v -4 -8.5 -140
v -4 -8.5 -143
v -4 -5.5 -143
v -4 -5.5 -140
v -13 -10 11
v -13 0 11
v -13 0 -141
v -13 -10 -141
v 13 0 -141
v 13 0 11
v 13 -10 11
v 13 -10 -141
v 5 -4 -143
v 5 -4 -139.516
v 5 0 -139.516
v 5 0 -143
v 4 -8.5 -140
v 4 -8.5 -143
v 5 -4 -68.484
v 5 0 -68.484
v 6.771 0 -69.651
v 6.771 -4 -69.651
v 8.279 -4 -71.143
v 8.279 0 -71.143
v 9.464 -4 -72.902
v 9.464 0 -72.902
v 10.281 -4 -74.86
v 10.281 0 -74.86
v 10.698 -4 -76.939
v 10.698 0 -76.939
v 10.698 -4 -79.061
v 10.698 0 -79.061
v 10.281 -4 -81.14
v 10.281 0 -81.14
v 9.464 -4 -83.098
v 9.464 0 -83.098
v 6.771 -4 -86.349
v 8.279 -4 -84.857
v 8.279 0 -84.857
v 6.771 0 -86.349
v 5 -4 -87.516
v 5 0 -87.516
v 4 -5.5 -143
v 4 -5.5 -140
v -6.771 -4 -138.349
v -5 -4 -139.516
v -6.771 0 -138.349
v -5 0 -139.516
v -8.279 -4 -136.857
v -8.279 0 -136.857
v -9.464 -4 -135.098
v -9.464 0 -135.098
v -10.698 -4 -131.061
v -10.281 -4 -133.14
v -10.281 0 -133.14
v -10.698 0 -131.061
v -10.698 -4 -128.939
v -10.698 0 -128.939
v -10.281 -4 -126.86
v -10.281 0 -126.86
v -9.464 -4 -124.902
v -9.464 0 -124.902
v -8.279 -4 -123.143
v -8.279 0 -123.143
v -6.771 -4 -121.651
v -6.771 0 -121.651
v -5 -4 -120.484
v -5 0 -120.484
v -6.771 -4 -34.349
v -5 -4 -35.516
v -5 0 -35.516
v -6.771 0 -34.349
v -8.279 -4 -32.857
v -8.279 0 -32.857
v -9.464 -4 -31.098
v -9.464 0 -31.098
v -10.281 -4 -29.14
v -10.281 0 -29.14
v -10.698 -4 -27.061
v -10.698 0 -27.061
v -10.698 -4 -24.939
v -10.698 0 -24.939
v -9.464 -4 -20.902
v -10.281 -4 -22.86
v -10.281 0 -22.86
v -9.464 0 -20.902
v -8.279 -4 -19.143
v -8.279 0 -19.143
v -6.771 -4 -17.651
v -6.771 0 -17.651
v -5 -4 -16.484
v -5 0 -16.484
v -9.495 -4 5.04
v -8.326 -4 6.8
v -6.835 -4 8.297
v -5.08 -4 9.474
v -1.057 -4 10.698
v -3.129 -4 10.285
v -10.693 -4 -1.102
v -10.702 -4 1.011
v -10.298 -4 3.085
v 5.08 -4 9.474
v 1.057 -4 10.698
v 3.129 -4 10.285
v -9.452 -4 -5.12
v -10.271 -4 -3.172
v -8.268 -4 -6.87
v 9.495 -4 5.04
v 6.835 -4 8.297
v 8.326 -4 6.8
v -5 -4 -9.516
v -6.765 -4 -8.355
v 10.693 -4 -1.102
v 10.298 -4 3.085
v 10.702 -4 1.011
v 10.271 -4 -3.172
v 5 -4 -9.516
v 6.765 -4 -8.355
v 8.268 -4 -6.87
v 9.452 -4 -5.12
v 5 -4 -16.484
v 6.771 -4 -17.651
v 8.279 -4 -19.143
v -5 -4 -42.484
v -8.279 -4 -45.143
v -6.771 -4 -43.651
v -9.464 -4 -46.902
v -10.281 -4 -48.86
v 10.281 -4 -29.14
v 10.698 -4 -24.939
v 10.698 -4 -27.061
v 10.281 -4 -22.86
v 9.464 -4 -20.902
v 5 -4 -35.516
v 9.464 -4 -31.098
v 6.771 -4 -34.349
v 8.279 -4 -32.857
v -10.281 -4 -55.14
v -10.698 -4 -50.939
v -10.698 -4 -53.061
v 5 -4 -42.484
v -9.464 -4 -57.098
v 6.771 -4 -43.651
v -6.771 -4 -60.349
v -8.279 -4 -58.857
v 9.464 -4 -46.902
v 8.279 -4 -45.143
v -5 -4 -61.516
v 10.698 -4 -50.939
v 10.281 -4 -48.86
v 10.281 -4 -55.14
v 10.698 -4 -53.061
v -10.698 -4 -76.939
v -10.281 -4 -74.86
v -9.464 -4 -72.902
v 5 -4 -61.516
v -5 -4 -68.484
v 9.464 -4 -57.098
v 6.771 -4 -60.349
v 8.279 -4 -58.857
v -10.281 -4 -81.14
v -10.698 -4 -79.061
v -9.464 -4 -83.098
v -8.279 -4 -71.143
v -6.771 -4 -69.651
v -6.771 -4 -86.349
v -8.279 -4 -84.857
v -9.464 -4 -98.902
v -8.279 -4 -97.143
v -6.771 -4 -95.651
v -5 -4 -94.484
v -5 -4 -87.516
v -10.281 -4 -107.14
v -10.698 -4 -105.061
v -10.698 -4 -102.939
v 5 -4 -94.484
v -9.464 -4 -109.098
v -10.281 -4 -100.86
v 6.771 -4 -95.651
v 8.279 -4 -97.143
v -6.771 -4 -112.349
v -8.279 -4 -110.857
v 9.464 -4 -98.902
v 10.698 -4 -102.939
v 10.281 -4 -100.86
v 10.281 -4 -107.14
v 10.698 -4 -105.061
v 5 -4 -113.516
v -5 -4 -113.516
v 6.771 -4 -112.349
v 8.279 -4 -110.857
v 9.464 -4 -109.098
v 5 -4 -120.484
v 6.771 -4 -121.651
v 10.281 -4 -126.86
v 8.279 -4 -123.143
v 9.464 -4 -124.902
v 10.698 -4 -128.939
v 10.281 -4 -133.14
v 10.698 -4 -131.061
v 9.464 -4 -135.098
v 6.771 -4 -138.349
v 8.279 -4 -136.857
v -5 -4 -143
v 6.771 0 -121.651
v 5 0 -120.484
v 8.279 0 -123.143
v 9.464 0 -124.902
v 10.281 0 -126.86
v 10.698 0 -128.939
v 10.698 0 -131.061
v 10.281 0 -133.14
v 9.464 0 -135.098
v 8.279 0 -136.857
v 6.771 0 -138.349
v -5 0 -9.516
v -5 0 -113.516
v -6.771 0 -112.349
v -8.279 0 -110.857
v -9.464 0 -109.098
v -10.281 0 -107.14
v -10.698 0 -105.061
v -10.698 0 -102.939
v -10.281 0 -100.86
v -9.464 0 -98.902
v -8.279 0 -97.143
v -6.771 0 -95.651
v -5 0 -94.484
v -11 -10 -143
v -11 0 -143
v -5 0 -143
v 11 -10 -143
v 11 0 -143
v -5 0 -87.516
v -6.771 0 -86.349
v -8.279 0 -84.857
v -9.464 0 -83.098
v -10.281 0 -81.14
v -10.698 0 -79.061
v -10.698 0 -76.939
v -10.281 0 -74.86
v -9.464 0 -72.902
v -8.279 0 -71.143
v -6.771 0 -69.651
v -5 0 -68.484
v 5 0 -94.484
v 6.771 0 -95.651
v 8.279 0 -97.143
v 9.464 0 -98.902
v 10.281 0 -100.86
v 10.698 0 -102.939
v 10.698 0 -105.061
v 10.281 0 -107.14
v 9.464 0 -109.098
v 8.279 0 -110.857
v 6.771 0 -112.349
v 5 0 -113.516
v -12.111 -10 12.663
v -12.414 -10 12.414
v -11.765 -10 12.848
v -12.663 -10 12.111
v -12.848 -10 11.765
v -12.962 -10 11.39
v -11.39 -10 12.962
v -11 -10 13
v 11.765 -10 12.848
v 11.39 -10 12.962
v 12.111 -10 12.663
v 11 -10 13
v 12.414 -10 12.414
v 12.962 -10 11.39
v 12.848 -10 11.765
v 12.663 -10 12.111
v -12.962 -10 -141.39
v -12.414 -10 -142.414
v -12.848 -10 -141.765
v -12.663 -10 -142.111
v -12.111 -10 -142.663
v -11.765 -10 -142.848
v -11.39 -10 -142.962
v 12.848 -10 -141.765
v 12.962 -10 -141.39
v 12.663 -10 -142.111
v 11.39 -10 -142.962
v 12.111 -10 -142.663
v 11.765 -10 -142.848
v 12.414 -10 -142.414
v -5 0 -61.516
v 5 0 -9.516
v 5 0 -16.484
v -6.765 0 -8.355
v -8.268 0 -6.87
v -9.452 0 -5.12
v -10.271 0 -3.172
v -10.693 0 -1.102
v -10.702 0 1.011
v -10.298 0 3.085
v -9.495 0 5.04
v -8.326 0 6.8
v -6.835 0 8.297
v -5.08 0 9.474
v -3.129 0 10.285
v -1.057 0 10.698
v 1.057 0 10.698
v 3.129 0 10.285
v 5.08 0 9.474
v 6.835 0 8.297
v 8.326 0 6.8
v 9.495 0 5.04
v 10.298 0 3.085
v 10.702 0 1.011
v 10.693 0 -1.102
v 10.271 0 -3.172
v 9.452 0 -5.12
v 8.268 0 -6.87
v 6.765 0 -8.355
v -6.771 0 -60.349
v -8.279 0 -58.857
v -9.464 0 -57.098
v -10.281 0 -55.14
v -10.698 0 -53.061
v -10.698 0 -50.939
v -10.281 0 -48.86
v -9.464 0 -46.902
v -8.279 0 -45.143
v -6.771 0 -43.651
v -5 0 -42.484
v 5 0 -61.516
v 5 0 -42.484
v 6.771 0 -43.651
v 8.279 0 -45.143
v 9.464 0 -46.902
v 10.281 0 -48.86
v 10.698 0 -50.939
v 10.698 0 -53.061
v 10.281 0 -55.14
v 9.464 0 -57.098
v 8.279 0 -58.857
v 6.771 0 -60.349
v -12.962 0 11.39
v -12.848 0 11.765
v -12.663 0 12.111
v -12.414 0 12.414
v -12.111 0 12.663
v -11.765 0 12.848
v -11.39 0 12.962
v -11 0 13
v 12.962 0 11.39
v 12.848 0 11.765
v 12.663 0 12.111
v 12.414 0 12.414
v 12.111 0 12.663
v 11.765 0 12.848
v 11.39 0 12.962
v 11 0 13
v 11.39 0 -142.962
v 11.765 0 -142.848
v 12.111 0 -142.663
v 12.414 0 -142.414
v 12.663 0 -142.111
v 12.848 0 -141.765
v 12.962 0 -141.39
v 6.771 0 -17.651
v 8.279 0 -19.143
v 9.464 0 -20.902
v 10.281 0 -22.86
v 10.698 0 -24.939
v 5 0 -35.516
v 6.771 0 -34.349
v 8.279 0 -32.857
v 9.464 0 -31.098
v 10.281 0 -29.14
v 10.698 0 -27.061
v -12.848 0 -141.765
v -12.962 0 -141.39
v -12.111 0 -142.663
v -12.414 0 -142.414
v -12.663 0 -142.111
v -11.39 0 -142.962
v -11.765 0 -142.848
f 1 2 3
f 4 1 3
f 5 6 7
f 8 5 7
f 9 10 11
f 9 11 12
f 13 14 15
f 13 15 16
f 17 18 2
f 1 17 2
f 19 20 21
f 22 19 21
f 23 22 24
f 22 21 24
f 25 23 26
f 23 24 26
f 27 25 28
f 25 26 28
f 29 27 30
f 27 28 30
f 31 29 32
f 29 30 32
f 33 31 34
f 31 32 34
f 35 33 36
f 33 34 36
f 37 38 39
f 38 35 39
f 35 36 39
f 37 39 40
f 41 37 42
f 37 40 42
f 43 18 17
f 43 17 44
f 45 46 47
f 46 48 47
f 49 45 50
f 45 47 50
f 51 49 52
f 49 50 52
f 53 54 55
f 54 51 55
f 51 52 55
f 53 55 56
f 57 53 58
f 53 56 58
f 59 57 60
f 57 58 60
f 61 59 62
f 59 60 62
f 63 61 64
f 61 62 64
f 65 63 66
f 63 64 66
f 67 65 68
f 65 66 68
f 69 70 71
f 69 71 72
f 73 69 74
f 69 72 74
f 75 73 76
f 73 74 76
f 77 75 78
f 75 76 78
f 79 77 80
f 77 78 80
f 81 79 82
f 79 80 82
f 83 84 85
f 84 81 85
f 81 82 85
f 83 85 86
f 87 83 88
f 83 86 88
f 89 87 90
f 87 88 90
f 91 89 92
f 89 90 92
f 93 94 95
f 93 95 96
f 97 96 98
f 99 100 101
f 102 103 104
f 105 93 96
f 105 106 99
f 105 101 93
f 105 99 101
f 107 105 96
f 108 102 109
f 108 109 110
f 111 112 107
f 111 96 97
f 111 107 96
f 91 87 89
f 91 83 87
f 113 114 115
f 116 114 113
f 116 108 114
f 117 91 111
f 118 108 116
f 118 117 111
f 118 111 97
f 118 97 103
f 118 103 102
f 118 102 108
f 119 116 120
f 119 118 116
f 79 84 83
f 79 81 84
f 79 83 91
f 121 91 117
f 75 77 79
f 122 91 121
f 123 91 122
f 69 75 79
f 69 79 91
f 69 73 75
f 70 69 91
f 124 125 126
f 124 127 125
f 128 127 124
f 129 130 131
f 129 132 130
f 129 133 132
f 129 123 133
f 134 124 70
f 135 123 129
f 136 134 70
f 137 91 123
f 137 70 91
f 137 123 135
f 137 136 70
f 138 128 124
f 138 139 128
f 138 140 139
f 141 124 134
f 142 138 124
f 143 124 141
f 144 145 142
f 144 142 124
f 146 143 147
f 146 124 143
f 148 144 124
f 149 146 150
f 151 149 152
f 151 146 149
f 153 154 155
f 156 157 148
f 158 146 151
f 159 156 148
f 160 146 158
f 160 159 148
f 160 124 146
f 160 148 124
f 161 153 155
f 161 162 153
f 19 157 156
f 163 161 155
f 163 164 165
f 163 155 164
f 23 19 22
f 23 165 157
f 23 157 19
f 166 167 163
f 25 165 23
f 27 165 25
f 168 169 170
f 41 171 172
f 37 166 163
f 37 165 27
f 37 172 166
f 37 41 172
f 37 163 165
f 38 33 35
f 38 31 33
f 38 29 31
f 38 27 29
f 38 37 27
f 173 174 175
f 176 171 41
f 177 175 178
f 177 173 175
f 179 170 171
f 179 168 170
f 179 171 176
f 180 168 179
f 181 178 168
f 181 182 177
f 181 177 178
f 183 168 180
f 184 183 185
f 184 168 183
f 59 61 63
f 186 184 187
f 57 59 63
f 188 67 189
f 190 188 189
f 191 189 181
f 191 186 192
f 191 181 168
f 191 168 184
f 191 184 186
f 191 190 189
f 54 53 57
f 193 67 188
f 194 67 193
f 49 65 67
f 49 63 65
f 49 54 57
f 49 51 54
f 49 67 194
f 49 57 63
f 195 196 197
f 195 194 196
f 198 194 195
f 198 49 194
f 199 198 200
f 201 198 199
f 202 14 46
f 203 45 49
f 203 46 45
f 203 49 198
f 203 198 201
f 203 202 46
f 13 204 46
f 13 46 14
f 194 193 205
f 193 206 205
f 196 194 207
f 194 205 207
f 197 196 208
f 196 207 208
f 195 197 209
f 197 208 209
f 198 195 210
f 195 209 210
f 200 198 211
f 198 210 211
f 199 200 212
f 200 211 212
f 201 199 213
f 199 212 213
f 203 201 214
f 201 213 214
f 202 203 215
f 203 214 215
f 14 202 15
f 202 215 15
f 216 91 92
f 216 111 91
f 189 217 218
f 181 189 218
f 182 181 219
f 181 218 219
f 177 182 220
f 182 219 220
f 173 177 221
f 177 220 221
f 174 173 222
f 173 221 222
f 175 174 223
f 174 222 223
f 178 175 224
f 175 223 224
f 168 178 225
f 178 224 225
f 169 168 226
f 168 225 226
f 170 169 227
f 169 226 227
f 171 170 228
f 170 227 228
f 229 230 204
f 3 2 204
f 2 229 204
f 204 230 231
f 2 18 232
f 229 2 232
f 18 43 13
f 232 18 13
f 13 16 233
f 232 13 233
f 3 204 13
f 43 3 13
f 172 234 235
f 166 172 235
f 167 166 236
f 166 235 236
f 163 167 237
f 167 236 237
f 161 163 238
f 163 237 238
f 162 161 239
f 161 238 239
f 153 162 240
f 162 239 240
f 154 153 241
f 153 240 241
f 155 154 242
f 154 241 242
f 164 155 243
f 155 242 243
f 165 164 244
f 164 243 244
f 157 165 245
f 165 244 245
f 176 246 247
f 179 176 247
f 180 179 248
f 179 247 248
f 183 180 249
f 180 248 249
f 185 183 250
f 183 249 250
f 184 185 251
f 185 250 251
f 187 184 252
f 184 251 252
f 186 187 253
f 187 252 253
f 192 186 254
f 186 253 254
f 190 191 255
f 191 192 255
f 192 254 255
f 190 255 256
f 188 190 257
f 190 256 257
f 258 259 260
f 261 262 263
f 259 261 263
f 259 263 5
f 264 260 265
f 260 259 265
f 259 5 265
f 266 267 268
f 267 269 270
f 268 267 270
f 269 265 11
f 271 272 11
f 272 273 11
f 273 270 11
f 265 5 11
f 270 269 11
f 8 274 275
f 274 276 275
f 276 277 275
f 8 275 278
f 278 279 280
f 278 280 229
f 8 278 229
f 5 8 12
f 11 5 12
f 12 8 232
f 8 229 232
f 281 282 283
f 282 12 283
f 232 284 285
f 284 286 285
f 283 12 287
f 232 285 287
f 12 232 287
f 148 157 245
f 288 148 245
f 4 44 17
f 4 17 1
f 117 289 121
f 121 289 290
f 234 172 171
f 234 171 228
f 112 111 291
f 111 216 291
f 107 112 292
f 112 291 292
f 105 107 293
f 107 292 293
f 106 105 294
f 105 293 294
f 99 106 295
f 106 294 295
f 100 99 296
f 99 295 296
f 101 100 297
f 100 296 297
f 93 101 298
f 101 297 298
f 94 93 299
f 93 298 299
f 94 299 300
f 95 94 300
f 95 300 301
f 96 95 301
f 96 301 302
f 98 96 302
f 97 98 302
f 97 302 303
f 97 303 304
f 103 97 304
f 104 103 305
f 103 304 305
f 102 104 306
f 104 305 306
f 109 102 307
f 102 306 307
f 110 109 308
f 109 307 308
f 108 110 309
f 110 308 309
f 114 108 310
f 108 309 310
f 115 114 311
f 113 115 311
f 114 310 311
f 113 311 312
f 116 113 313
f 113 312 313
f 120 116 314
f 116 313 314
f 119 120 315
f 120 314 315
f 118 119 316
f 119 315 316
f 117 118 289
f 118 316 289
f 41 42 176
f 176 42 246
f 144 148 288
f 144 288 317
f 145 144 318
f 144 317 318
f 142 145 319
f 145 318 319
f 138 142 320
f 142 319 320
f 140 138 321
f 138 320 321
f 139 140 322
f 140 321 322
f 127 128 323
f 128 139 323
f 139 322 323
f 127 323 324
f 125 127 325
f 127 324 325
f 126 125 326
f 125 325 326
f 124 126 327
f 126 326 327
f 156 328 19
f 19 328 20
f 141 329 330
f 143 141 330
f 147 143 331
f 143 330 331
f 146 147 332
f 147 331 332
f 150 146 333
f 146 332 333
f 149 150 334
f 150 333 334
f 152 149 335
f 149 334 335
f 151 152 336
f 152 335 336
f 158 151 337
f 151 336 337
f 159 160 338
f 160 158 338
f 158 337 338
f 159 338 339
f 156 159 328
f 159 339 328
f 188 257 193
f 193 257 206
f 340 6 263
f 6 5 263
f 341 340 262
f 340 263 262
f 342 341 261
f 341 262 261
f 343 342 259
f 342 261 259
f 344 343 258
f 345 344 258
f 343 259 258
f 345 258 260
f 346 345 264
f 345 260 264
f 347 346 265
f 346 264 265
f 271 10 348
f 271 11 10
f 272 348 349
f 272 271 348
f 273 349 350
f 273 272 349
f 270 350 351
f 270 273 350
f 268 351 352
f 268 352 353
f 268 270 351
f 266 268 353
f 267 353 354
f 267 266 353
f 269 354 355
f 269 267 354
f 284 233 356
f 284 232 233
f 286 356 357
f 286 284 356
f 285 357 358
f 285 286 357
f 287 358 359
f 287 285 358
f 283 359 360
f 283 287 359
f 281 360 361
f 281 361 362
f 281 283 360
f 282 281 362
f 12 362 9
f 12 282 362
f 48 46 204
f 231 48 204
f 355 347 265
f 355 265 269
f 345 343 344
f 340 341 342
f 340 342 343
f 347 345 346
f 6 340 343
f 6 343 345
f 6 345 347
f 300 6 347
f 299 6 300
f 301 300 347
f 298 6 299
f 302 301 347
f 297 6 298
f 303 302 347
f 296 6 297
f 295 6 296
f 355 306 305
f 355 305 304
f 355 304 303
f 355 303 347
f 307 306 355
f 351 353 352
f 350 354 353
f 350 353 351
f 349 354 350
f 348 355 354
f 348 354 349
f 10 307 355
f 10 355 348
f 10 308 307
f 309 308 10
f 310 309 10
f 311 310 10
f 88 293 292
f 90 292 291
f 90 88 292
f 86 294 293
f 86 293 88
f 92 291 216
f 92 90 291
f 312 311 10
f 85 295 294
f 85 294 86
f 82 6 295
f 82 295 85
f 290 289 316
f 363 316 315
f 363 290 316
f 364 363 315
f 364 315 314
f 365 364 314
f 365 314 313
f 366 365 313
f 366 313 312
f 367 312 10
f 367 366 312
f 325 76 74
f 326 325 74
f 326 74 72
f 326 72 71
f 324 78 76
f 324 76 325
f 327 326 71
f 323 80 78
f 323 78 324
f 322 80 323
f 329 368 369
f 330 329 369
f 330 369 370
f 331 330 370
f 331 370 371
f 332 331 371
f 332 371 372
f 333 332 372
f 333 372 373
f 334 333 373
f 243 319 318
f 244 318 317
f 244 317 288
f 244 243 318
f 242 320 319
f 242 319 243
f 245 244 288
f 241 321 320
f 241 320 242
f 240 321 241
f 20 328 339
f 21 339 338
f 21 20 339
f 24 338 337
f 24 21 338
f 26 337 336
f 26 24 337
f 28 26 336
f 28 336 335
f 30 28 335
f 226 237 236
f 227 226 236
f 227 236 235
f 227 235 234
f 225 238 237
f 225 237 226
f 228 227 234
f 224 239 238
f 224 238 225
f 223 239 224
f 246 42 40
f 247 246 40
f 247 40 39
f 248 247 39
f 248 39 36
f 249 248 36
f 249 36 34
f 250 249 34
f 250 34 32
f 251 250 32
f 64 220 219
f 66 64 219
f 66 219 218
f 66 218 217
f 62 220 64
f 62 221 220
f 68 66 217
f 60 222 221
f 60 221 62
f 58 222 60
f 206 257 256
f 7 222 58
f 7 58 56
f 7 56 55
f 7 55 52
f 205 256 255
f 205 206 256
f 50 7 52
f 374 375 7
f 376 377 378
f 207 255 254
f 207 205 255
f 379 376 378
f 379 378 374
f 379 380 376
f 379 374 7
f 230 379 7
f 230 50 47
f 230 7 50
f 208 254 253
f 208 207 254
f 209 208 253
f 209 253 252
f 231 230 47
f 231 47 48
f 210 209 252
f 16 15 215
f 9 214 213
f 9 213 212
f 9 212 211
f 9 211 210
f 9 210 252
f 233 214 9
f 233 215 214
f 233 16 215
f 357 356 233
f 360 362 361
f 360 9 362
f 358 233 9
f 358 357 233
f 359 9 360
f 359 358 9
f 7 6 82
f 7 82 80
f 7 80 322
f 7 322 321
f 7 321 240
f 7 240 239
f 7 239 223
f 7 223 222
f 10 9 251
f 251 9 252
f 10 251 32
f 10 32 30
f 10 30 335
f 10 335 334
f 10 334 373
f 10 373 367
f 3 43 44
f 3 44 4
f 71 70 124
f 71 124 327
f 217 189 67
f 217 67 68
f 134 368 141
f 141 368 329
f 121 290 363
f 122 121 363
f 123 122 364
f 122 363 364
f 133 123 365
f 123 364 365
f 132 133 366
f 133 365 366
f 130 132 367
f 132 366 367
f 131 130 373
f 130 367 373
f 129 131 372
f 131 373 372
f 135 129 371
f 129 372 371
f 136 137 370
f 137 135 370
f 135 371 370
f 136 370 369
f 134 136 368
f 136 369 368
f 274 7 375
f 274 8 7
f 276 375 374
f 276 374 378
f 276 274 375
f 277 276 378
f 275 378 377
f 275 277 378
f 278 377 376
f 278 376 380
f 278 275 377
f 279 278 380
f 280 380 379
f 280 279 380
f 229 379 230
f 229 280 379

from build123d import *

# Parameters (mm, degrees)
SKETCH5_W           = 26
SKETCH5_H           = 26
BOSS_EXTRUDE1_DEPTH = 10
SKETCH4_R           = 10.75
CUT_EXTRUDE1_DEPTH  = 4
SKETCH6_W           = 10
SKETCH6_H           = 3.483566845
CUT_EXTRUDE2_DEPTH  = 4
LPATTERN1_COUNT     = 6
LPATTERN1_PITCH     = 26
SKETCH7_W           = 10
SKETCH7_H           = 4
CUT_EXTRUDE3_DEPTH  = 131
FILLET1_R           = 2
SKETCH9_W           = 8
SKETCH9_H           = 3
CUT_EXTRUDE4_DEPTH  = 3


with BuildPart() as part:
    # Sketch5 → Boss-Extrude1 (new body)
    with BuildSketch(Plane(origin=(0, 0, 0), x_dir=(1, 0, 0), z_dir=(0, 1, 0))):
        Rectangle(SKETCH5_W, SKETCH5_H)
    boss_extrude1 = extrude(amount=-BOSS_EXTRUDE1_DEPTH)

    # Sketch4 → Cut-Extrude1 (cut)
    with BuildSketch(Plane(origin=(0, 0, 0), x_dir=(1, 0, 0), z_dir=(0, 1, 0))):
        Circle(SKETCH4_R)
    cut_extrude1 = extrude(amount=-CUT_EXTRUDE1_DEPTH, mode=Mode.SUBTRACT)

    # Sketch6 → Cut-Extrude2 (cut)
    with BuildSketch(Plane(origin=(0, 0, 0), x_dir=(1, 0, 0), z_dir=(0, 1, 0))):
        with Locations((0, 11.258216578)):
            Rectangle(SKETCH6_W, SKETCH6_H)
    cut_extrude2 = extrude(amount=-CUT_EXTRUDE2_DEPTH, mode=Mode.SUBTRACT)

    # LPattern1: Boss-Extrude1, Cut-Extrude1, Cut-Extrude2 ×6
    with Locations(*[(0, 0, -i * LPATTERN1_PITCH) for i in range(1, LPATTERN1_COUNT)]):
        add(boss_extrude1)
        add(cut_extrude1, mode=Mode.SUBTRACT)
        add(cut_extrude2, mode=Mode.SUBTRACT)

    # Sketch7 → Cut-Extrude3 (cut, through all)
    with BuildSketch(Plane.XY.offset(-13)):
        with Locations((0, -2)):
            Rectangle(SKETCH7_W, SKETCH7_H)
    extrude(amount=-CUT_EXTRUDE3_DEPTH, mode=Mode.SUBTRACT)

    # Fillet1
    fillet1_edges = [part.edges().sort_by_distance(p)[0] for p in [
        (13, -5, -143),
        (-13, -5, -143),
        (13, -5, 13),
        (-13, -5, 13),
    ]]
    fillet(fillet1_edges, radius=FILLET1_R)

    # Sketch9 → Cut-Extrude4 (cut)
    with BuildSketch(Plane(origin=(0, 0, -143), x_dir=(-1, 0, 0), z_dir=(0, 0, -1))):
        with Locations((0, -7)):
            Rectangle(SKETCH9_W, SKETCH9_H)
    extrude(amount=-CUT_EXTRUDE4_DEPTH, mode=Mode.SUBTRACT)


solid = part.part
